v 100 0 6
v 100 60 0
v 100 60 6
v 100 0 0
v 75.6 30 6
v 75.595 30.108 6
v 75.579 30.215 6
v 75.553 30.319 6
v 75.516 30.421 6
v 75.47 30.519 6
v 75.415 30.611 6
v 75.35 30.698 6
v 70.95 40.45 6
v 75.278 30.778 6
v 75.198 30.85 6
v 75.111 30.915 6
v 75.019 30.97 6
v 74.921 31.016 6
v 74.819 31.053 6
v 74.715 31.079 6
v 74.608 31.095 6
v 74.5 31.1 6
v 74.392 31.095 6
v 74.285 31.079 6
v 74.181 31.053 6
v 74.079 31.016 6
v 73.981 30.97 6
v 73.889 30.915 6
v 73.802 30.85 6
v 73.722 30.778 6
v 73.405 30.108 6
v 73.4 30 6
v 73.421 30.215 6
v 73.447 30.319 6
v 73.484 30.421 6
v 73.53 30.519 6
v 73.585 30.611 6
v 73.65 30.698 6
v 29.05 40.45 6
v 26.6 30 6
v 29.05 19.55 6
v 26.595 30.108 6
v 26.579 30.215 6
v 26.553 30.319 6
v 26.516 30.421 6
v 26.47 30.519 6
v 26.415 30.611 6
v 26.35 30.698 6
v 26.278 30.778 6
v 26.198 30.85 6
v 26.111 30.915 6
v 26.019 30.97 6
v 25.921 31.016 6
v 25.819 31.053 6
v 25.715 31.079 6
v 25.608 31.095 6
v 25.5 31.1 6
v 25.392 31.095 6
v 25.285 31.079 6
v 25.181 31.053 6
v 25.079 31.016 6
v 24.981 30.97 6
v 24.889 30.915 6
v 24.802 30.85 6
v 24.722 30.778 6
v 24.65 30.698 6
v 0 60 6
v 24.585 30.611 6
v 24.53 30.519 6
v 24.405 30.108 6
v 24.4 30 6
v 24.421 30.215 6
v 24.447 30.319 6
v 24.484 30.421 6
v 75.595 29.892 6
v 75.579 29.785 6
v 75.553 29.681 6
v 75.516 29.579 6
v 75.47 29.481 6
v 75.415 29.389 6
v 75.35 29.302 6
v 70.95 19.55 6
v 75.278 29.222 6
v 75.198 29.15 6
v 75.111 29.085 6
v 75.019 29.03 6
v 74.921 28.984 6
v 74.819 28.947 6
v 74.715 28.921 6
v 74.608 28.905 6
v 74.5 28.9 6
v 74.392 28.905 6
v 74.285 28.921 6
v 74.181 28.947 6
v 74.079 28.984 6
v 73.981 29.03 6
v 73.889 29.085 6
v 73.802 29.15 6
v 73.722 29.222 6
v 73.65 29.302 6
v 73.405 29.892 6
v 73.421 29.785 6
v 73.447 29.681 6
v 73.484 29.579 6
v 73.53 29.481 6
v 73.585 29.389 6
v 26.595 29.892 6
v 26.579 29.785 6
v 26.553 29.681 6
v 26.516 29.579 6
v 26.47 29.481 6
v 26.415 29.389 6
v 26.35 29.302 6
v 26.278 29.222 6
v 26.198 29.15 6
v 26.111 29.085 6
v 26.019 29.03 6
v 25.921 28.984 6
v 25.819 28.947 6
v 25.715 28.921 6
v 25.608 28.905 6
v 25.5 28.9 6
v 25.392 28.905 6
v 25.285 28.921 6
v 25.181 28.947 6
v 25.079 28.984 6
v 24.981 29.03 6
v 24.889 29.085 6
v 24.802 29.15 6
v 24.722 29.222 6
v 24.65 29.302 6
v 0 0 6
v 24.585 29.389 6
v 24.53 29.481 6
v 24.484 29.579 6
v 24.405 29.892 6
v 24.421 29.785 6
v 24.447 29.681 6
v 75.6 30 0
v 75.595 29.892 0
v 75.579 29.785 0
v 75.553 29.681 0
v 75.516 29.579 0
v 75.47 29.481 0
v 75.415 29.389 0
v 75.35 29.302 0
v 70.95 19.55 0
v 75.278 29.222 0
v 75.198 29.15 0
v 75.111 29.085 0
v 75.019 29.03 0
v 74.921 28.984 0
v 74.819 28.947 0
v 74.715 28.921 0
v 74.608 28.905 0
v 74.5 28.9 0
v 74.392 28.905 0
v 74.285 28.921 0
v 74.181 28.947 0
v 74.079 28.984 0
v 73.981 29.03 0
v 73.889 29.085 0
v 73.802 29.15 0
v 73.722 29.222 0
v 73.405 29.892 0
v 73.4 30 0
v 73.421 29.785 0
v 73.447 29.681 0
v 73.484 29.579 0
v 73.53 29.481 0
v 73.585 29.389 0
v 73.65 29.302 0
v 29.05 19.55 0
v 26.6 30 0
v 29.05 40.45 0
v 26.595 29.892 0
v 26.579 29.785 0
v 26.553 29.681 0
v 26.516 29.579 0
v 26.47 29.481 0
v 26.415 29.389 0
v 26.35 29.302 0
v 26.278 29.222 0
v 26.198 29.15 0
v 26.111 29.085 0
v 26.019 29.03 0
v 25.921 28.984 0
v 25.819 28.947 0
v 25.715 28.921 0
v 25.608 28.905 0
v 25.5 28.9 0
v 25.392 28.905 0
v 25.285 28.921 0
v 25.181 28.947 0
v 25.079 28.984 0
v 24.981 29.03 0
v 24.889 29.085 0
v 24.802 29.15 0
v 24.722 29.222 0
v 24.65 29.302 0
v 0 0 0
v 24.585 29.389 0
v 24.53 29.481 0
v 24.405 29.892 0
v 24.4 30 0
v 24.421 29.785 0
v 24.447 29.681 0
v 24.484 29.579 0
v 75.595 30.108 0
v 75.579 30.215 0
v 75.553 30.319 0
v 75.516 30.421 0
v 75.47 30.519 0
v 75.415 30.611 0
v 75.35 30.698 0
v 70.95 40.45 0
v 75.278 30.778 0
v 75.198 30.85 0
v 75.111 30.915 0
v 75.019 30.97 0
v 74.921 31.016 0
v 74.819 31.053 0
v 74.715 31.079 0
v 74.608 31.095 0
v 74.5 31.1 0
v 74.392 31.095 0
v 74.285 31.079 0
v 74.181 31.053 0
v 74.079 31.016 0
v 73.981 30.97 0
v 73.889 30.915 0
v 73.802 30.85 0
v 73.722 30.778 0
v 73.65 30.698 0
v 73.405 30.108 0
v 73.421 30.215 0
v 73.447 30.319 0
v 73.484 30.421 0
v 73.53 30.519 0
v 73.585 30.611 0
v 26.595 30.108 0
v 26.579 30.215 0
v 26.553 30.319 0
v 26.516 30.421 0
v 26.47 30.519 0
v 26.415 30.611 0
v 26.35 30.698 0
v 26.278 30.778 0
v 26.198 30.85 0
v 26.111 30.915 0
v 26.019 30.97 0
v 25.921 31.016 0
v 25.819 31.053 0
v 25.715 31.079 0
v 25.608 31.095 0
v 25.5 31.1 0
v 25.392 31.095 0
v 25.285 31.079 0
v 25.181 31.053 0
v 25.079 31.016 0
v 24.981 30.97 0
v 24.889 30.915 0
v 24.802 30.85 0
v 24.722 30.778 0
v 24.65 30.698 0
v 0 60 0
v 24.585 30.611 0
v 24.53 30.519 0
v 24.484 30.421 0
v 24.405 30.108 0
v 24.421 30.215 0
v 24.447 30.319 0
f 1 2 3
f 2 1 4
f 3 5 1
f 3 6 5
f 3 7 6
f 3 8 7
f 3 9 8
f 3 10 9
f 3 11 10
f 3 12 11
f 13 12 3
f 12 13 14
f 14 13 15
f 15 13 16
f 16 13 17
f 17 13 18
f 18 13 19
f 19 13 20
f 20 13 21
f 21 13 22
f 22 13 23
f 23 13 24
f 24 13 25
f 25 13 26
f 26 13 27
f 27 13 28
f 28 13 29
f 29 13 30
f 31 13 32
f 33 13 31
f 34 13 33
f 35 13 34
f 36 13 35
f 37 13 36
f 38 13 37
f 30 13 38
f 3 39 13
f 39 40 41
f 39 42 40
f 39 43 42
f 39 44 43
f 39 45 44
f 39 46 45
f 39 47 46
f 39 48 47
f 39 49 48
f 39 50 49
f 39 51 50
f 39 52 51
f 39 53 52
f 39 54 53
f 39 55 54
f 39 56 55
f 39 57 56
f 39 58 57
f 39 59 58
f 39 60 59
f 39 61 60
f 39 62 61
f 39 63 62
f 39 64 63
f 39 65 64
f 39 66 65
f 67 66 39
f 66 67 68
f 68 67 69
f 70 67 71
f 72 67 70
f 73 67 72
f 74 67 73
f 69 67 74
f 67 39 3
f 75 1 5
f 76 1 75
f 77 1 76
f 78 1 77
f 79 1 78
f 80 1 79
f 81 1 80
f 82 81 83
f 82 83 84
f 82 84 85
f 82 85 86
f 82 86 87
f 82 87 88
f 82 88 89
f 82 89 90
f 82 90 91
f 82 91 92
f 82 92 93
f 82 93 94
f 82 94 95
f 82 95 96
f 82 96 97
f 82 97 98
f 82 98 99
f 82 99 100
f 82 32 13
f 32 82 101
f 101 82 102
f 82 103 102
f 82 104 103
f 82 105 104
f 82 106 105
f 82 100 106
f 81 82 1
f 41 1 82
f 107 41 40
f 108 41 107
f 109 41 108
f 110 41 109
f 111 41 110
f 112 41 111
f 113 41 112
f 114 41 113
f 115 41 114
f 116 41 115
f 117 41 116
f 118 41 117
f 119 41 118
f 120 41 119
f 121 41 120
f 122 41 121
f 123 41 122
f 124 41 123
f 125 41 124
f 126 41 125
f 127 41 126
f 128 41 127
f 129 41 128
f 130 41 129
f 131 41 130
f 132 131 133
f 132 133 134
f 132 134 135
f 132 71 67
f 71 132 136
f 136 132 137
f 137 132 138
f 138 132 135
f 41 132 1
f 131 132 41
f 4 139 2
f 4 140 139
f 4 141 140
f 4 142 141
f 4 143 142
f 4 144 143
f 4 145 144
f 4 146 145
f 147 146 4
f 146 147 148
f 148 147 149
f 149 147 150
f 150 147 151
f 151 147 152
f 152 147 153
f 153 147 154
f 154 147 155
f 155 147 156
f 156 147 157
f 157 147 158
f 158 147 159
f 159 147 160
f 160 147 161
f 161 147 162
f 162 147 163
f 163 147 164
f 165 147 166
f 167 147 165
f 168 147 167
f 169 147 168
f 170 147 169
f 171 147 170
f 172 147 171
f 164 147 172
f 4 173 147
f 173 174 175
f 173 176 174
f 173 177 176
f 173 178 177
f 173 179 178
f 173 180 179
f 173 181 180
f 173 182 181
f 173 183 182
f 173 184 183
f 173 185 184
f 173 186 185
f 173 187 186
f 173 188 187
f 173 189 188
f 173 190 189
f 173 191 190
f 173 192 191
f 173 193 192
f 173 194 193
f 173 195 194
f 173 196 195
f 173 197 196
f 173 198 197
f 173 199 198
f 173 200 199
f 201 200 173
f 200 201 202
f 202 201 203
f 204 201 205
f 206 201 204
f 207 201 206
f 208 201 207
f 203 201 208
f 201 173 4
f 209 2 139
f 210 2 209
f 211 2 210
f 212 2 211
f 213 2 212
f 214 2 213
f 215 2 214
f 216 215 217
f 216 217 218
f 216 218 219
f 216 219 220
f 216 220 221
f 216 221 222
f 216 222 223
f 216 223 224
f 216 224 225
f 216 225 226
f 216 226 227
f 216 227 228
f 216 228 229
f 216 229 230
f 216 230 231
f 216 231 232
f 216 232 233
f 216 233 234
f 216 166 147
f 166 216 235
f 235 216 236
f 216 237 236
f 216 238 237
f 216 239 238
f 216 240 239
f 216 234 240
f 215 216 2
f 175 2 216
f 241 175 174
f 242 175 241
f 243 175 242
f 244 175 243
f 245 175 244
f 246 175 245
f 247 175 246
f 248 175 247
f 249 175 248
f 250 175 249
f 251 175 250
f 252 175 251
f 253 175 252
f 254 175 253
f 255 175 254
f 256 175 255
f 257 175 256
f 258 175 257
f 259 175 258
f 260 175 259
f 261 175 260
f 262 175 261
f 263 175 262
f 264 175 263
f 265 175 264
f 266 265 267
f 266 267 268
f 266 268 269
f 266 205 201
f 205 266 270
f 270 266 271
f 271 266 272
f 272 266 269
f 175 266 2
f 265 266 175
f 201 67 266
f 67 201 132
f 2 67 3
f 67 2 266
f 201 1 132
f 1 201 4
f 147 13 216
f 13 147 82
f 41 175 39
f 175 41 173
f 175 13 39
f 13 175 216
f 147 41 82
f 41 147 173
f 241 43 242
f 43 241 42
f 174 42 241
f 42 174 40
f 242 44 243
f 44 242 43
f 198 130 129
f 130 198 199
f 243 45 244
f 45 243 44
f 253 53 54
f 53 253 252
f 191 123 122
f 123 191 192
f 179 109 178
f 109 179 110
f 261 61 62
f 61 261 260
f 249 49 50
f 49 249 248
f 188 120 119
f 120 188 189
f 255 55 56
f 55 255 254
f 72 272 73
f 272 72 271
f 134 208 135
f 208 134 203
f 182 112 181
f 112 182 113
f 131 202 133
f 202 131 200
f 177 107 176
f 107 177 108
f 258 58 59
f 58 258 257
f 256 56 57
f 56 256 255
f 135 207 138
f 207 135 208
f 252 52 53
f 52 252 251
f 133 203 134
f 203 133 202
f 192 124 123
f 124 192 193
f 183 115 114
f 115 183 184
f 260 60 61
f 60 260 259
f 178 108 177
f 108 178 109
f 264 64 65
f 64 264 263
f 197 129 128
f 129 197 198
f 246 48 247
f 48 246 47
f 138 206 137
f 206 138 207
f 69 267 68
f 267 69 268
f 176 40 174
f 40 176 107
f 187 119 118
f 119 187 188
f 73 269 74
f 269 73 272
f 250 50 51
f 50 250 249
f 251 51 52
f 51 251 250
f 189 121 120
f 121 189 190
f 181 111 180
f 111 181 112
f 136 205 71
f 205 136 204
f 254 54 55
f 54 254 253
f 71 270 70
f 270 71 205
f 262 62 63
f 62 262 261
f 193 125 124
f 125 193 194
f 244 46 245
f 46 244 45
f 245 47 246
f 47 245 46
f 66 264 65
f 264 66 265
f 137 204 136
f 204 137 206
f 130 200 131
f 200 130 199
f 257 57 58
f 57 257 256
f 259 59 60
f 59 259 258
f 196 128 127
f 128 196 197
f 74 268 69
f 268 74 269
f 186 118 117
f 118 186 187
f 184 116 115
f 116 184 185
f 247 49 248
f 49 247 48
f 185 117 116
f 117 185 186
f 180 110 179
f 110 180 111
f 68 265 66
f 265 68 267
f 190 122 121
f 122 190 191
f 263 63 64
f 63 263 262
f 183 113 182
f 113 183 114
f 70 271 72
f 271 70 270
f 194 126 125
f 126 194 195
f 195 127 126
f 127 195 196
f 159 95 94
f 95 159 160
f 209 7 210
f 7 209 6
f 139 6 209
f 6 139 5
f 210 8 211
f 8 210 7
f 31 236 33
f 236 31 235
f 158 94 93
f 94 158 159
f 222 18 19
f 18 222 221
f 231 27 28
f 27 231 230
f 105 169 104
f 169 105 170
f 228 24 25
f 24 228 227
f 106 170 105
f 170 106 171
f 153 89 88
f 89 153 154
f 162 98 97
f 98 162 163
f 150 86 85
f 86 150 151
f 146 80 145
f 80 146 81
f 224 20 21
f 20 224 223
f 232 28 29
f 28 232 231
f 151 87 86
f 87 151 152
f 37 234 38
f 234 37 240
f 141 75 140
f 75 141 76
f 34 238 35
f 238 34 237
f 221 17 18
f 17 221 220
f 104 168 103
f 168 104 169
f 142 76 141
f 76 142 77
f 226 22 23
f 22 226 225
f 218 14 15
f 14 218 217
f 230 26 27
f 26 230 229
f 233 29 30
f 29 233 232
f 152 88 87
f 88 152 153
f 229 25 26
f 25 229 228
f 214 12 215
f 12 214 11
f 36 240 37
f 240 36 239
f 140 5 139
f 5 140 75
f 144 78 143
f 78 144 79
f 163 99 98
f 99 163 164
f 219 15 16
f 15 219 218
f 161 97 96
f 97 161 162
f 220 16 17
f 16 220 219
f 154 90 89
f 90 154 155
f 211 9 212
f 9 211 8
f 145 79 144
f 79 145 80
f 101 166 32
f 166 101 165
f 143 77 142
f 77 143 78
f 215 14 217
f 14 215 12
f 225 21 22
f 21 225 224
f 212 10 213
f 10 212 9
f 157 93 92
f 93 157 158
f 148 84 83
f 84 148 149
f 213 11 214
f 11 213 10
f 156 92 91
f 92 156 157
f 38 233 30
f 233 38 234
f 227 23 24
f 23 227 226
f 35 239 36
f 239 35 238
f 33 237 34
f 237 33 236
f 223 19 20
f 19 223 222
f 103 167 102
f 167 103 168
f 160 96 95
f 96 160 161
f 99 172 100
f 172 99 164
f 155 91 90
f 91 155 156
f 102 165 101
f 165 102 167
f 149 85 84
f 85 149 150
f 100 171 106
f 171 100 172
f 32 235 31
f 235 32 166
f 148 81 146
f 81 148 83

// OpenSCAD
// Auto-generated by Mecha-Splicer
// servo_mount=bench_mix_6_hip_mount servo=mg996r

$fn = 64;

module servo_mount() {
  plate_w = 100.0; plate_h = 60.0; plate_t = 6.0;
  clearance = 0.6; hole_d = 2.2;
  body_w = 40.7; body_h = 19.7; flange_w = 54.0; flange_h = 19.7;
  hole_spacing_x = 49.0;
  difference() {
    cube([plate_w, plate_h, plate_t], center=false);
    translate([(plate_w-body_w-clearance*2)/2, (plate_h-body_h-clearance*2)/2, -1])
      cube([body_w+clearance*2, body_h+clearance*2, plate_t+2], center=false);
    translate([plate_w/2 - hole_spacing_x/2, plate_h/2, -1]) cylinder(h=plate_t+2, d=hole_d, center=false);
    translate([plate_w/2 + hole_spacing_x/2, plate_h/2, -1]) cylinder(h=plate_t+2, d=hole_d, center=false);
  }
}
servo_mount();
